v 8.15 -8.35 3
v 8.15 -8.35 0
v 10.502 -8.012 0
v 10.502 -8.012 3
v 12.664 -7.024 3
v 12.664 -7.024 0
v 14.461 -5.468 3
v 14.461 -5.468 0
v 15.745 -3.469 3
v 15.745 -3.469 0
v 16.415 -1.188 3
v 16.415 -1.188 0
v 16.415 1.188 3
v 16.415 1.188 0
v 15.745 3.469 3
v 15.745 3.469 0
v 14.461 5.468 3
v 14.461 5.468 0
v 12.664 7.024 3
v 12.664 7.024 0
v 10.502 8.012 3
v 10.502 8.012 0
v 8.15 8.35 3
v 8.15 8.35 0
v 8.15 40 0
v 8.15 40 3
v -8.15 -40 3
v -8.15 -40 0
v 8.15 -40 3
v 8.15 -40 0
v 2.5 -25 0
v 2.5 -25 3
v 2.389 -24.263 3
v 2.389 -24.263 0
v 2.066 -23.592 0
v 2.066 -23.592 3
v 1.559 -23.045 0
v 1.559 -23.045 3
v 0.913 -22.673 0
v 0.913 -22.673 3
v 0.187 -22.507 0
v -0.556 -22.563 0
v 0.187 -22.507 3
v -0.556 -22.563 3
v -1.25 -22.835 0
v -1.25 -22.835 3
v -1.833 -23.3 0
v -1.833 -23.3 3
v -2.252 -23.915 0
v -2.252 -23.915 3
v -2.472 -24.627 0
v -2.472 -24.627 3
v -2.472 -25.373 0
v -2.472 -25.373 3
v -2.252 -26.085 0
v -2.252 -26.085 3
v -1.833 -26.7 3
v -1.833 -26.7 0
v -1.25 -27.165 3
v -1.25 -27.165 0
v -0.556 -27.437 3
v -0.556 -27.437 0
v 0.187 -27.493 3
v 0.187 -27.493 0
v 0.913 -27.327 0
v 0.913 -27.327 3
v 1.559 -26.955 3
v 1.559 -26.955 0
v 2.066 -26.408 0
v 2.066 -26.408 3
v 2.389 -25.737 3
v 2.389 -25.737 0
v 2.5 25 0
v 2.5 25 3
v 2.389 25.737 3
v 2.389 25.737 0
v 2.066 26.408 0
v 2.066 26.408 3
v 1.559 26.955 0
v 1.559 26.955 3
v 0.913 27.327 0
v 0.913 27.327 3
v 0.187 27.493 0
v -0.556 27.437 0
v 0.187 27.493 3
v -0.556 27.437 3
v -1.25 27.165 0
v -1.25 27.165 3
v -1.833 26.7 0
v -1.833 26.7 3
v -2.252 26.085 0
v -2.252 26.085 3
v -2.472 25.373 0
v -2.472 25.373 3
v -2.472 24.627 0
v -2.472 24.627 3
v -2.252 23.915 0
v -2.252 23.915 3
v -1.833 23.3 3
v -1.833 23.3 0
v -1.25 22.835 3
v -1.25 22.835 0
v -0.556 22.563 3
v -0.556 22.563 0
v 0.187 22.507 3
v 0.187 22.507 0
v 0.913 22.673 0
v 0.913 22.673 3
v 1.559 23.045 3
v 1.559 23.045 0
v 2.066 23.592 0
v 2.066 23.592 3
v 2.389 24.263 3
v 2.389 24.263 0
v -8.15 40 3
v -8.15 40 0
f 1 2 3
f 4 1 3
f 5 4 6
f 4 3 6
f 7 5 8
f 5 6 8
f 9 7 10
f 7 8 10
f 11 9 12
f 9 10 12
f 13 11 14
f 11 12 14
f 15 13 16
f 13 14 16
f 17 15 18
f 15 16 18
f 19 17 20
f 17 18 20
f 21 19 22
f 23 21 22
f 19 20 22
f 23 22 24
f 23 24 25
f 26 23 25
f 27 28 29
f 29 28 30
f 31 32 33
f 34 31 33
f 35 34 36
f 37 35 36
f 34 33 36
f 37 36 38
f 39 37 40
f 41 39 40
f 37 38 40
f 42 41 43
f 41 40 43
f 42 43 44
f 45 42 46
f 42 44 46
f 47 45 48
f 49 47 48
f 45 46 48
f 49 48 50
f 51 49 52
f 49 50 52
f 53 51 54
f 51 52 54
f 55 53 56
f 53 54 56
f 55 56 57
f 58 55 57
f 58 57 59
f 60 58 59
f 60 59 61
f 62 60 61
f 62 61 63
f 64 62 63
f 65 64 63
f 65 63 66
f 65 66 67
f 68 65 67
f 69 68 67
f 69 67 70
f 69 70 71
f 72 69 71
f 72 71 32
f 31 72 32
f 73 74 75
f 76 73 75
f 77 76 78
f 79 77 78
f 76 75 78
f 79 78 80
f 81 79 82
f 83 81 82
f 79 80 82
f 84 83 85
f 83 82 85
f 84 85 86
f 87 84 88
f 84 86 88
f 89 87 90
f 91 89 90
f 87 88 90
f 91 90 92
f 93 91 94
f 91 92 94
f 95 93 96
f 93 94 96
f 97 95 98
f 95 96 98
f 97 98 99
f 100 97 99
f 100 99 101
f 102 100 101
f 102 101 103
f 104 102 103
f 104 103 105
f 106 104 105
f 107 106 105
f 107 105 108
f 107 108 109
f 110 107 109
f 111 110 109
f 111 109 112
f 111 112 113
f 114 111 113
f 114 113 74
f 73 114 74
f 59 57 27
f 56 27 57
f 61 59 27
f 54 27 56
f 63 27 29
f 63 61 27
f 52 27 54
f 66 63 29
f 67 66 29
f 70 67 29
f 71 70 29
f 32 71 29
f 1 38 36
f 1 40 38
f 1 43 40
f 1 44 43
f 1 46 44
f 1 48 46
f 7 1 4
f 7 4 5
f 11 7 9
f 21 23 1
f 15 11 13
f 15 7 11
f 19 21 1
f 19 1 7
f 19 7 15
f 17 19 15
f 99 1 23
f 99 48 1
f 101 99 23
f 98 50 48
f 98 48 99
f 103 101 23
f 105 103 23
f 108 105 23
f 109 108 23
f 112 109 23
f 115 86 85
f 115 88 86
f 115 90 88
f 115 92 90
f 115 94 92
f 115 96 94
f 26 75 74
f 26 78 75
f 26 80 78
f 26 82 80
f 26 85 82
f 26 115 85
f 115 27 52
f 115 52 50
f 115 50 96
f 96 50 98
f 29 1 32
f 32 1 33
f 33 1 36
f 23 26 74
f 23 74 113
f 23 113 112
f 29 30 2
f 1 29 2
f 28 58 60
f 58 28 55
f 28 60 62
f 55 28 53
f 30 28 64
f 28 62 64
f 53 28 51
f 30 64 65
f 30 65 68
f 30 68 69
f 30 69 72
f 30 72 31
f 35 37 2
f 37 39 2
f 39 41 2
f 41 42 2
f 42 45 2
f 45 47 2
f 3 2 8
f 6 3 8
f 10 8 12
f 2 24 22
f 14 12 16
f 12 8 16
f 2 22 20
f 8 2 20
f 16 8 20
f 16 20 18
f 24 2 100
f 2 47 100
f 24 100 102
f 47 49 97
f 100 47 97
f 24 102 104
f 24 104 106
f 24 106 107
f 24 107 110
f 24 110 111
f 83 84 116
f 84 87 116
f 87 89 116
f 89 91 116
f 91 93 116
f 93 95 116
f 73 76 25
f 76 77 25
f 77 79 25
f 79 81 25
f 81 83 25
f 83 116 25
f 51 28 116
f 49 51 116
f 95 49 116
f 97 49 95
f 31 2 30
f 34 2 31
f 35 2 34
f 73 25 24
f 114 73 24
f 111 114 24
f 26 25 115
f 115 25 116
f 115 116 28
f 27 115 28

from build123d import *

# Parameters (mm, degrees)
PAD_DEPTH    = 3
SKETCH001_R  = 2.5
POCKET_DEPTH = 5


with BuildPart() as part:
    # Sketch → Pad (new body)
    with BuildSketch(Plane.XY):
        with BuildLine():
            Line((-8.15, 40), (-8.15, -40))
            Line((-8.15, -40), (8.15, -40))
            Line((8.15, -40), (8.15, -8.35))
            ThreePointArc((8.15, -8.35), (16.5, 0), (8.15, 8.35))
            Line((8.15, 8.35), (8.15, 40))
            Line((8.15, 40), (-8.15, 40))
        make_face()
    extrude(amount=PAD_DEPTH)

    # Sketch001 (on Face8 of Pad) → Pocket (cut)
    with BuildSketch(Plane.XY.offset(3)):
        with Locations((0, 25)):
            Circle(SKETCH001_R)
        with Locations((0, -25)):
            Circle(SKETCH001_R)
    extrude(amount=-POCKET_DEPTH, mode=Mode.SUBTRACT)


solid = part.part
